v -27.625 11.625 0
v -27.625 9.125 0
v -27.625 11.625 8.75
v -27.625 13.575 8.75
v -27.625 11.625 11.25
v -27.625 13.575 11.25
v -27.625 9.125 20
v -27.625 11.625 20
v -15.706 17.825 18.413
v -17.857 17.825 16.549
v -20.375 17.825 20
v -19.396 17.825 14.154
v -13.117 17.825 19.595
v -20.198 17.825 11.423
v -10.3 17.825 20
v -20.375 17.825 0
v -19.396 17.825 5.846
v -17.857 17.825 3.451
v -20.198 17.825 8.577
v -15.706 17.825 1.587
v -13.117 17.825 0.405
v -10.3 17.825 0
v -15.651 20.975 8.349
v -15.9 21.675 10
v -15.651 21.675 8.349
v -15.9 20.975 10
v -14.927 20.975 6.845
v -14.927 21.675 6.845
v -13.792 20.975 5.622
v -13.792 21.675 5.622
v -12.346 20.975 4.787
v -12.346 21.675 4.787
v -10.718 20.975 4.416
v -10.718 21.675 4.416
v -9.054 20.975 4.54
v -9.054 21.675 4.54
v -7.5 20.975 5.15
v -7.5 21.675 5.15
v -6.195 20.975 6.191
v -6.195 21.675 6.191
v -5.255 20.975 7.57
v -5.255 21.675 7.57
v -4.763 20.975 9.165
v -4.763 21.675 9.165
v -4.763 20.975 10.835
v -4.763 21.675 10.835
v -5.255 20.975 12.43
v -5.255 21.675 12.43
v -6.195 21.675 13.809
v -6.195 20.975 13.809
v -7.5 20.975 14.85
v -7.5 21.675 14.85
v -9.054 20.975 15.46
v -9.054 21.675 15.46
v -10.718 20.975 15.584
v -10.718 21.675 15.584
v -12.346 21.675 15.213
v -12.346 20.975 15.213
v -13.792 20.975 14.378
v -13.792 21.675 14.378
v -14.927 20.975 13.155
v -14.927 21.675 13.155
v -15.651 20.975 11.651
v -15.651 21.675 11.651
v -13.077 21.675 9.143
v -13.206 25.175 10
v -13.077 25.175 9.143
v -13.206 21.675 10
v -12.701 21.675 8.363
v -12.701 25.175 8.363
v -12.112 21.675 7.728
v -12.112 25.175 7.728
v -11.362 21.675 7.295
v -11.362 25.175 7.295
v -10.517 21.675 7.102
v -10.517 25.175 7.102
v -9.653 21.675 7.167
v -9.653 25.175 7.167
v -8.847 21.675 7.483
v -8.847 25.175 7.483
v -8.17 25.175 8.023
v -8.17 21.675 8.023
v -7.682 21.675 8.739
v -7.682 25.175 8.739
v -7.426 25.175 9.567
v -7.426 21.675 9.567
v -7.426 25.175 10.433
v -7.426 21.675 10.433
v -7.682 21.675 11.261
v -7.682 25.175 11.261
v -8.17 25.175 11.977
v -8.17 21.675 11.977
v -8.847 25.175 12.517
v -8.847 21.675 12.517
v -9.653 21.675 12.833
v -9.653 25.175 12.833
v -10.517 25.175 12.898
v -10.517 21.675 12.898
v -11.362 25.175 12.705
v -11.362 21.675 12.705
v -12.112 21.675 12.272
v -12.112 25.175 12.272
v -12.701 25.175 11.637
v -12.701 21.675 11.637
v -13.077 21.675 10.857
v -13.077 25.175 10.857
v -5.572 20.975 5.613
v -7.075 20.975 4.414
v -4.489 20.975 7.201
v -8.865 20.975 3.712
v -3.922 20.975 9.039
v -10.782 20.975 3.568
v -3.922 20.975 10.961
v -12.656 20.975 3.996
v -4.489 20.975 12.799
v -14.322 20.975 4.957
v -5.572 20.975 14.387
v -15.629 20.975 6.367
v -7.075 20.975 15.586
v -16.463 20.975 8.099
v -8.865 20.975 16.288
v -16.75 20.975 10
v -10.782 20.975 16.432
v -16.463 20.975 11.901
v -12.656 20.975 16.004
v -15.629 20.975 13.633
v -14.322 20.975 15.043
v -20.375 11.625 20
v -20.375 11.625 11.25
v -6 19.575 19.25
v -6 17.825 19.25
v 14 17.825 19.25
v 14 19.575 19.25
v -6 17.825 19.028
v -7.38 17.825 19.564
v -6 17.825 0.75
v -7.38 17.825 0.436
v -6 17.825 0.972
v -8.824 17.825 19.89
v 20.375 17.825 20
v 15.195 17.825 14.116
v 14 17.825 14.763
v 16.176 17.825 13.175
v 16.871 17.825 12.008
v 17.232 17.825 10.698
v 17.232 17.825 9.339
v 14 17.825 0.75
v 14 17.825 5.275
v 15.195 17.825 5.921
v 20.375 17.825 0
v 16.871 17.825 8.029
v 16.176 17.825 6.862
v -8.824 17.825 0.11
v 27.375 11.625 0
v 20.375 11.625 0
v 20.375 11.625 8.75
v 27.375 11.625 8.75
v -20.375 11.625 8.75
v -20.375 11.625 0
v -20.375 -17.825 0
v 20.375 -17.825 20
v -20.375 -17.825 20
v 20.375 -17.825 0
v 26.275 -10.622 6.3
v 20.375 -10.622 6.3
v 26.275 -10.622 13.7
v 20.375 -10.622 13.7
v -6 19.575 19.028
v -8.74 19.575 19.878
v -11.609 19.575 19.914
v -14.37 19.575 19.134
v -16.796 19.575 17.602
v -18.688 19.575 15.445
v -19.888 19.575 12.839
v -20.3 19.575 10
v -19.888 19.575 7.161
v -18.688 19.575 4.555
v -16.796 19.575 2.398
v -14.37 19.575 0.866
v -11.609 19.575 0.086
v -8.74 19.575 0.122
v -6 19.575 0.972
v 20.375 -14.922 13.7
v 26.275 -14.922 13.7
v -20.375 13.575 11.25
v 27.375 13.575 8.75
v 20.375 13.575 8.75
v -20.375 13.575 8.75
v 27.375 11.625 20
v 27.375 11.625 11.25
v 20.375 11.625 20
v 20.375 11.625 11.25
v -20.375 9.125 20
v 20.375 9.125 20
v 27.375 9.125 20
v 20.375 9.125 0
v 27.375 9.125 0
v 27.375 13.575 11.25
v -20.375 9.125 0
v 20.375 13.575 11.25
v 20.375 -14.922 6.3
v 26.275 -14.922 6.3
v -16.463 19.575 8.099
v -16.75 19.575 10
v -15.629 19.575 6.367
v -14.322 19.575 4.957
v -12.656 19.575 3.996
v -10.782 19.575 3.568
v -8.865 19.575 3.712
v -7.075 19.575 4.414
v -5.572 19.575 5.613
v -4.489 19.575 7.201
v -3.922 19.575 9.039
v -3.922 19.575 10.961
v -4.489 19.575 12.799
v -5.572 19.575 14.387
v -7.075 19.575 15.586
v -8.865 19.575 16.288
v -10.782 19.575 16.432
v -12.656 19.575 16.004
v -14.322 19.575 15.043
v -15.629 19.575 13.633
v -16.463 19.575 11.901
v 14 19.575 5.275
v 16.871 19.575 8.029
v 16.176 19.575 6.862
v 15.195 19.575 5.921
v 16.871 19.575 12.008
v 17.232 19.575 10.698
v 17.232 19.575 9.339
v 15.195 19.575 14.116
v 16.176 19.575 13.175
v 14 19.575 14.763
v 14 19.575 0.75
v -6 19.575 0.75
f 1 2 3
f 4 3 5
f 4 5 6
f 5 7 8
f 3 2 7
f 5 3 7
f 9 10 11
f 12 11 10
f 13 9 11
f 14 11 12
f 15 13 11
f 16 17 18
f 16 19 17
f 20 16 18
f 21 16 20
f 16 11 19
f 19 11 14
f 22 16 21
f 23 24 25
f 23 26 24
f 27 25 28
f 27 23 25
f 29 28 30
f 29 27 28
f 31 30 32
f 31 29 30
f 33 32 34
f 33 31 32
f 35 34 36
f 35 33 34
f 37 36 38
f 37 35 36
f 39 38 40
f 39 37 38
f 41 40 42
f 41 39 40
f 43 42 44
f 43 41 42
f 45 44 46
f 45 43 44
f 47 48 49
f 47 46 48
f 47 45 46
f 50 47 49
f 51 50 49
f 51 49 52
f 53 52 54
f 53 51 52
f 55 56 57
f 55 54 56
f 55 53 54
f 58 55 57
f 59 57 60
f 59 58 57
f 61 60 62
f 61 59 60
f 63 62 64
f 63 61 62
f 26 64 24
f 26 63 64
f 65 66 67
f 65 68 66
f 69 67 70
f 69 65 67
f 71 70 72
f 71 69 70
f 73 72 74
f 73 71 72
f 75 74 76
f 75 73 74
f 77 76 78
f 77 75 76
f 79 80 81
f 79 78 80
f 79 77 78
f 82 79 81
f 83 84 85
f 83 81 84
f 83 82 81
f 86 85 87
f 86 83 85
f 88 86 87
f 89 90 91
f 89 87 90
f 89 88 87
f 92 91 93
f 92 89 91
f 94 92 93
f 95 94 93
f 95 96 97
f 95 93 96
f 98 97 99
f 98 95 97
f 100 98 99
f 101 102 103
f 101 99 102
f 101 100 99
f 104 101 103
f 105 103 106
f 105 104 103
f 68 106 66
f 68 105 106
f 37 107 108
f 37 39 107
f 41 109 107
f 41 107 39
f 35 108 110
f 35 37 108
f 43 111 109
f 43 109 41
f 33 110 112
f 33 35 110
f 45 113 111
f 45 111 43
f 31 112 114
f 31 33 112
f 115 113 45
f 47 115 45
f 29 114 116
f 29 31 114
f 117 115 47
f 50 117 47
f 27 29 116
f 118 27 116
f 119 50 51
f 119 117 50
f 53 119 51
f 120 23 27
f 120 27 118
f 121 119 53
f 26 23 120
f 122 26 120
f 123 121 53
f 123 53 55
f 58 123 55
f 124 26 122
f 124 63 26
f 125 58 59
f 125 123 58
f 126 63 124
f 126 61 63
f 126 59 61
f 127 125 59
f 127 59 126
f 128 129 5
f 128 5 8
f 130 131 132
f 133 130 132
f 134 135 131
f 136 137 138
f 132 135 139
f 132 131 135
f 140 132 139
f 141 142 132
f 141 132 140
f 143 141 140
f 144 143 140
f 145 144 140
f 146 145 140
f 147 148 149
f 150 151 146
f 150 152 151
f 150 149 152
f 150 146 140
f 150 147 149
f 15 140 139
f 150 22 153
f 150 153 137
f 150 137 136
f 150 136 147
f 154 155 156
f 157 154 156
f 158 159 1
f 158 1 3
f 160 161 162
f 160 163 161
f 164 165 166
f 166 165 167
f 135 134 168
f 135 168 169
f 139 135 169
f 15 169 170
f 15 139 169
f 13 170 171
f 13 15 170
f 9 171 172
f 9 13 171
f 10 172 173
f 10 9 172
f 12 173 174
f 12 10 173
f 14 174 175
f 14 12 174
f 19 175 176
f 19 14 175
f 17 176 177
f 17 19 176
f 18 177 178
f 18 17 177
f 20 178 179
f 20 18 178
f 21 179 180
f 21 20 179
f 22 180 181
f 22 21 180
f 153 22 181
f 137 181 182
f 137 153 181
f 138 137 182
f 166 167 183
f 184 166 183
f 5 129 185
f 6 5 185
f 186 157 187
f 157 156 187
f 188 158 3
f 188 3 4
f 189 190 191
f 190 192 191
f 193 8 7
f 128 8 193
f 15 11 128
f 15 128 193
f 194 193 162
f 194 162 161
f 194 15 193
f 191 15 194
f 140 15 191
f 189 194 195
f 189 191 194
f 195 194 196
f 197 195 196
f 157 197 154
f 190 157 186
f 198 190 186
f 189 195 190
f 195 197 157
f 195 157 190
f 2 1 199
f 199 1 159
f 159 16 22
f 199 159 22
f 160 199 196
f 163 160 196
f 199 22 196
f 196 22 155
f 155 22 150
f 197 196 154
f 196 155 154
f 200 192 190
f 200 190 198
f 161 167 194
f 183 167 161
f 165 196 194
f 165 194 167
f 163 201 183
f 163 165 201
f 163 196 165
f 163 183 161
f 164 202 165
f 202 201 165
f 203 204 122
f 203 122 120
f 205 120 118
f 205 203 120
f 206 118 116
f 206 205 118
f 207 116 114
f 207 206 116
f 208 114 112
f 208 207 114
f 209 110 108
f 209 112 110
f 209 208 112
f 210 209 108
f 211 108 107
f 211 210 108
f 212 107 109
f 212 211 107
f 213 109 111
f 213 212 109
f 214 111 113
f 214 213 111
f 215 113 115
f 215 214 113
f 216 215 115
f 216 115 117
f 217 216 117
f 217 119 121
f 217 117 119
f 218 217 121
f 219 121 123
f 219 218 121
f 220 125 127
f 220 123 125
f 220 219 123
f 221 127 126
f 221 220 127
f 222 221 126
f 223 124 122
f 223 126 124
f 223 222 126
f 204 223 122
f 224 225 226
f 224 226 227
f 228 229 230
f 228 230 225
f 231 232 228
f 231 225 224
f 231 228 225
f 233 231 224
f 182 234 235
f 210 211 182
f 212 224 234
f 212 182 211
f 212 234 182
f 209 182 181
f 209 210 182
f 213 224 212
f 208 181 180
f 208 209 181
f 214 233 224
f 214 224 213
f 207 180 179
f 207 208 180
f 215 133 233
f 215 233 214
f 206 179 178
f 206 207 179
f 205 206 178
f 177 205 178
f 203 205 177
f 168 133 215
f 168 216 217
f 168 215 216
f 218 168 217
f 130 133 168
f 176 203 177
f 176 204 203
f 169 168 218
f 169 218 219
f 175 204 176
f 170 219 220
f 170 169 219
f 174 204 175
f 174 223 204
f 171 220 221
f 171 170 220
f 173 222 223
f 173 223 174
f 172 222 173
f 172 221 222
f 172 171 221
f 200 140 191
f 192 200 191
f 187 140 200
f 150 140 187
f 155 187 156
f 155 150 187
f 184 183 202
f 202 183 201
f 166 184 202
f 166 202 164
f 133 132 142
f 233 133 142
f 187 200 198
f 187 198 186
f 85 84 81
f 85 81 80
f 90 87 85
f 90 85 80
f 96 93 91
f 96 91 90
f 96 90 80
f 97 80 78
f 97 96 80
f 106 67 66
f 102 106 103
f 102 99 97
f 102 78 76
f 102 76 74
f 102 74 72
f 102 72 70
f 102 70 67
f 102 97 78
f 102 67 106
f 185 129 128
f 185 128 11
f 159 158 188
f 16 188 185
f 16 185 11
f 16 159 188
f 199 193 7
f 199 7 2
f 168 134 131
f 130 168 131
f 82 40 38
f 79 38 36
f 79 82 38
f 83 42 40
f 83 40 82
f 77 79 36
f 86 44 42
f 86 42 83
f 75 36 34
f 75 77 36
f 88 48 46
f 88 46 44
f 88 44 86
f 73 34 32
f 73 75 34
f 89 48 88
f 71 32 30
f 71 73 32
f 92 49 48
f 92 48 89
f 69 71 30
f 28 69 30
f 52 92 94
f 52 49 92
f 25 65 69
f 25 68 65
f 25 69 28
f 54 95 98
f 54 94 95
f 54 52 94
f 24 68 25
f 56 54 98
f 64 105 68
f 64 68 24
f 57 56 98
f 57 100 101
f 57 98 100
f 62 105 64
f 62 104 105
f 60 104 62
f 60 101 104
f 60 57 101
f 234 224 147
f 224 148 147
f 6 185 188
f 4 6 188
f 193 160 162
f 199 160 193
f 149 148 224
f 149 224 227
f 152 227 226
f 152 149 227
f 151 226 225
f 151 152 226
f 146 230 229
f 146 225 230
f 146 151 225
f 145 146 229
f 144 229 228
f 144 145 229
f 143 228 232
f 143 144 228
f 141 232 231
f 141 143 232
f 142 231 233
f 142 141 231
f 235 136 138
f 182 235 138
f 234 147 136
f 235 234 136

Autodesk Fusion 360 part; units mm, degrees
sketch "Sketch1" plane through (0, 0, 0) normal (0, 0, 1) x (1, 0, 0)
  line L0 (-20.375, 17.825) -> (20.375, 17.825)
  line L1 (20.375, 17.825) -> (20.375, -17.825)
  line L2 (20.375, -17.825) -> (-20.375, -17.825)
  line L3 (-20.375, -17.825) -> (-20.375, 17.825)
  line L4 (-20.375, 17.825) -> (20.375, -17.825) construction
  line L5 (20.375, 17.825) -> (-20.375, -17.825) construction
  dimension "d1" = 40.75
  dimension "d2" = 35.65
extrude "Extrude1" add sketch "Sketch1" along normal blind 20
sketch "Sketch2" plane through (20.375, 0, 0) normal (1, 0, 0) x (0, 1, 0)
  line L0 (-17.825, 0) -> (17.825, 0)
  line L1 (17.825, 0) -> (17.825, 20)
  line L2 (17.825, 20) -> (-17.825, 20)
  line L3 (-17.825, 20) -> (-17.825, 0)
  line L4 (17.825, 20) -> (11.625, 20)
  line L5 (11.625, 20) -> (9.125, 20)
  line L6 (9.125, 20) -> (9.125, 0)
  line L7 (9.125, 0) -> (11.625, 0)
  line L8 (11.625, 0) -> (11.625, 20)
  dimension "d5" = 6.2
  dimension "d6" = 2.5
extrude "Extrude2" add sketch "Sketch2" along normal blind 7 contours L0 L2 L5 L6 L7 L8
sketch "Sketch3" plane through (20.375, 0, 0) normal (1, 0, 0) x (0, 1, 0)
  line L0 (11.625, 20) -> (11.625, 0)
  line L1 (11.625, 0) -> (17.825, 0)
  line L2 (17.825, 0) -> (17.825, 20)
  line L3 (17.825, 20) -> (11.625, 20)
  line L4 (11.625, 20) -> (11.625, 11.25)
  line L5 (11.625, 0) -> (11.625, 8.75)
  line L6 (17.825, 10) -> (13.575, 10)
  line L7 (11.625, 11.25) -> (13.575, 11.25)
  line L8 (13.575, 11.25) -> (13.575, 10)
  line L9 (13.575, 10) -> (11.625, 10)
  line L10 (11.625, 10) -> (11.625, 11.25)
  line L11 (13.575, 10) -> (11.625, 10)
  line L12 (11.625, 10) -> (11.625, 8.75)
  line L13 (11.625, 8.75) -> (13.575, 8.75)
  line L14 (13.575, 8.75) -> (13.575, 10)
  dimension "d9" = 8.75
  dimension "d10" = 8.75
  dimension "d11" = 4.25
extrude "Extrude3" add sketch "Sketch3" along normal blind 7 contours L0 L7 L8 L9 L10 L11 | L0 L9 L11 L12 L13 L14
extrude "Extrude4" add 1 faces at (27.375, 9.9583, 9.5833) along direction (-1, 0, 0) blind 55
sketch "Sketch4" plane through (20.375, 0, 0) normal (1, 0, 0) x (0, 1, 0)
  line L0 (9.125, 0) -> (9.125, 20)
  line L1 (9.125, 20) -> (-17.825, 20)
  line L2 (-17.825, 20) -> (-17.825, 0)
  line L3 (-17.825, 0) -> (9.125, 0)
sketch "Sketch5" plane through (20.375, 0, 0) normal (1, 0, 0) x (0, 1, 0)
  line L0 (-15, 20) -> (-15, 13.7)
  line L1 (-17.8217, 13.7) -> (-14.9217, 13.7)
  line L2 (-14.9217, 0) -> (-14.9217, 6.3)
  line L3 (-14.9217, 6.3) -> (-10.6217, 6.3)
  line L4 (-10.6217, 6.3) -> (-10.6217, 13.7)
  line L5 (-10.6217, 13.7) -> (-14.9217, 13.7)
  line L6 (-14.9217, 13.7) -> (-14.9217, 6.3)
  dimension "d16" = 6.3
  dimension "d17" = 2.9
  dimension "d18" = 6.3
  dimension "d19" = 4.3
extrude "Extrude5" add sketch "Sketch5" along normal blind 5.9
sketch "Sketch6" plane through (0, 17.825, 0) normal (0, 1, 0) x (-1, 0, 0)
  line L0 (-20.375, 0) -> (20.375, 0)
  line L1 (20.375, 0) -> (20.375, 20)
  line L2 (20.375, 20) -> (-20.375, 20)
  line L3 (-20.375, 20) -> (-20.375, 0)
  line L4 (-20.375, 4.9972) -> (-14.025, 4.9972)
  line L5 (-14, 0) -> (-14, 0.75)
  line L6 (-14, 20) -> (-14, 19.25)
  line L7 (-14, 0.75) -> (6, 0.75)
  line L8 (6, 0.75) -> (6, 19.25)
  line L9 (6, 19.25) -> (-14, 19.25)
  line L10 (-14, 19.25) -> (-14, 0.75)
  circle A0 centre (10.3, 10) radius 10
  dimension "d22" = 6.35
  dimension "d23" = 0.75
  dimension "d24" = 0.75
  dimension "d25" = 20
  dimension "d26" = 18.5
extrude "Extrude6" add sketch "Sketch6" along normal blind 1.75 contours L8 A0 | L7 L8 L9 L10 A0 | L8 A0
sketch "Sketch7" plane through (0, 19.575, 0) normal (0, 1, 0) x (-1, 0, 0)
  arc A0 (6, 0.9717) -> (6, 19.0283) centre (10.3, 10) ccw
  line L0 (6, 19.0283) -> (6, 19.25)
  line L1 (6, 19.25) -> (-14, 19.25)
  line L2 (-14, 19.25) -> (-14, 0.75)
  line L3 (-14, 0.75) -> (6, 0.75)
  line L4 (6, 0.75) -> (6, 0.9717)
  circle A1 centre (10.3, 10) radius 6.45
  circle A2 centre (10.3, 10) radius 5.6
  circle A3 centre (10.3, 10) radius 2.9
  dimension "d29" = 12.9
  dimension "d30" = 11.2
  dimension "d31" = 5.8
extrude "Extrude7" add sketch "Sketch7" along normal blind 1.4 contours A1
extrude "Extrude8" add 1 faces at (-12.8422, 19.575, 11.496) along direction (0, 1, 0) blind 2.1
sketch "Sketch8" plane through (0, 21.675, 0) normal (0, 1, 0) x (-1, 0, 0)
  circle A0 centre (10.3, 10) radius 5.6
sketch "Sketch9" plane through (0, 21.675, 0) normal (0, 1, 0) x (-1, 0, 0)
  circle A0 through (13.2, 10, -2.1) (8.85, 12.5115, -2.1) (8.85, 7.4885, -2.1)
  circle A1 centre (10.3, 10) radius 2.9063
  circle A2 centre (10.3, 10) radius 5.6
  circle A3 centre (10.3, 10) radius 2.9063
  point P0 (10.3, 10)
extrude "Extrude9" add sketch "Sketch9" along normal blind 3.5 contours A1 A3
sketch "Sketch10" plane through (0, 17.825, 0) normal (0, 1, 0) x (-1, 0, 0)
  arc A0 (10.3, 20) -> (6, 19.0283) centre (10.3, 10) ccw
  line L0 (10.3, 20) -> (-20.375, 20)
  line L1 (-20.375, 20) -> (-20.375, 0)
  line L2 (-20.375, 0) -> (10.3, 0)
  arc A1 (6, 0.9717) -> (10.3, 0) centre (10.3, 10) ccw
  line L3 (6, 0.9717) -> (6, 0.75)
  line L4 (6, 0.75) -> (-14, 0.75)
  line L5 (-14, 0.75) -> (-14, 19.25)
  line L6 (-14, 19.25) -> (6, 19.25)
  line L7 (6, 19.25) -> (6, 19.0283)
  line L8 (-14, 14.875) -> (-14, 5.125)
  circle A2 centre (-12.2062, 10.0187) radius 5.0718
  point P0 (-14, 10)
  dimension "d38" = 9.75
extrude "Extrude10" add sketch "Sketch10" along normal blind 1.75 contours L5 L8 A2 picked at (-15.8122, 10.2321)
